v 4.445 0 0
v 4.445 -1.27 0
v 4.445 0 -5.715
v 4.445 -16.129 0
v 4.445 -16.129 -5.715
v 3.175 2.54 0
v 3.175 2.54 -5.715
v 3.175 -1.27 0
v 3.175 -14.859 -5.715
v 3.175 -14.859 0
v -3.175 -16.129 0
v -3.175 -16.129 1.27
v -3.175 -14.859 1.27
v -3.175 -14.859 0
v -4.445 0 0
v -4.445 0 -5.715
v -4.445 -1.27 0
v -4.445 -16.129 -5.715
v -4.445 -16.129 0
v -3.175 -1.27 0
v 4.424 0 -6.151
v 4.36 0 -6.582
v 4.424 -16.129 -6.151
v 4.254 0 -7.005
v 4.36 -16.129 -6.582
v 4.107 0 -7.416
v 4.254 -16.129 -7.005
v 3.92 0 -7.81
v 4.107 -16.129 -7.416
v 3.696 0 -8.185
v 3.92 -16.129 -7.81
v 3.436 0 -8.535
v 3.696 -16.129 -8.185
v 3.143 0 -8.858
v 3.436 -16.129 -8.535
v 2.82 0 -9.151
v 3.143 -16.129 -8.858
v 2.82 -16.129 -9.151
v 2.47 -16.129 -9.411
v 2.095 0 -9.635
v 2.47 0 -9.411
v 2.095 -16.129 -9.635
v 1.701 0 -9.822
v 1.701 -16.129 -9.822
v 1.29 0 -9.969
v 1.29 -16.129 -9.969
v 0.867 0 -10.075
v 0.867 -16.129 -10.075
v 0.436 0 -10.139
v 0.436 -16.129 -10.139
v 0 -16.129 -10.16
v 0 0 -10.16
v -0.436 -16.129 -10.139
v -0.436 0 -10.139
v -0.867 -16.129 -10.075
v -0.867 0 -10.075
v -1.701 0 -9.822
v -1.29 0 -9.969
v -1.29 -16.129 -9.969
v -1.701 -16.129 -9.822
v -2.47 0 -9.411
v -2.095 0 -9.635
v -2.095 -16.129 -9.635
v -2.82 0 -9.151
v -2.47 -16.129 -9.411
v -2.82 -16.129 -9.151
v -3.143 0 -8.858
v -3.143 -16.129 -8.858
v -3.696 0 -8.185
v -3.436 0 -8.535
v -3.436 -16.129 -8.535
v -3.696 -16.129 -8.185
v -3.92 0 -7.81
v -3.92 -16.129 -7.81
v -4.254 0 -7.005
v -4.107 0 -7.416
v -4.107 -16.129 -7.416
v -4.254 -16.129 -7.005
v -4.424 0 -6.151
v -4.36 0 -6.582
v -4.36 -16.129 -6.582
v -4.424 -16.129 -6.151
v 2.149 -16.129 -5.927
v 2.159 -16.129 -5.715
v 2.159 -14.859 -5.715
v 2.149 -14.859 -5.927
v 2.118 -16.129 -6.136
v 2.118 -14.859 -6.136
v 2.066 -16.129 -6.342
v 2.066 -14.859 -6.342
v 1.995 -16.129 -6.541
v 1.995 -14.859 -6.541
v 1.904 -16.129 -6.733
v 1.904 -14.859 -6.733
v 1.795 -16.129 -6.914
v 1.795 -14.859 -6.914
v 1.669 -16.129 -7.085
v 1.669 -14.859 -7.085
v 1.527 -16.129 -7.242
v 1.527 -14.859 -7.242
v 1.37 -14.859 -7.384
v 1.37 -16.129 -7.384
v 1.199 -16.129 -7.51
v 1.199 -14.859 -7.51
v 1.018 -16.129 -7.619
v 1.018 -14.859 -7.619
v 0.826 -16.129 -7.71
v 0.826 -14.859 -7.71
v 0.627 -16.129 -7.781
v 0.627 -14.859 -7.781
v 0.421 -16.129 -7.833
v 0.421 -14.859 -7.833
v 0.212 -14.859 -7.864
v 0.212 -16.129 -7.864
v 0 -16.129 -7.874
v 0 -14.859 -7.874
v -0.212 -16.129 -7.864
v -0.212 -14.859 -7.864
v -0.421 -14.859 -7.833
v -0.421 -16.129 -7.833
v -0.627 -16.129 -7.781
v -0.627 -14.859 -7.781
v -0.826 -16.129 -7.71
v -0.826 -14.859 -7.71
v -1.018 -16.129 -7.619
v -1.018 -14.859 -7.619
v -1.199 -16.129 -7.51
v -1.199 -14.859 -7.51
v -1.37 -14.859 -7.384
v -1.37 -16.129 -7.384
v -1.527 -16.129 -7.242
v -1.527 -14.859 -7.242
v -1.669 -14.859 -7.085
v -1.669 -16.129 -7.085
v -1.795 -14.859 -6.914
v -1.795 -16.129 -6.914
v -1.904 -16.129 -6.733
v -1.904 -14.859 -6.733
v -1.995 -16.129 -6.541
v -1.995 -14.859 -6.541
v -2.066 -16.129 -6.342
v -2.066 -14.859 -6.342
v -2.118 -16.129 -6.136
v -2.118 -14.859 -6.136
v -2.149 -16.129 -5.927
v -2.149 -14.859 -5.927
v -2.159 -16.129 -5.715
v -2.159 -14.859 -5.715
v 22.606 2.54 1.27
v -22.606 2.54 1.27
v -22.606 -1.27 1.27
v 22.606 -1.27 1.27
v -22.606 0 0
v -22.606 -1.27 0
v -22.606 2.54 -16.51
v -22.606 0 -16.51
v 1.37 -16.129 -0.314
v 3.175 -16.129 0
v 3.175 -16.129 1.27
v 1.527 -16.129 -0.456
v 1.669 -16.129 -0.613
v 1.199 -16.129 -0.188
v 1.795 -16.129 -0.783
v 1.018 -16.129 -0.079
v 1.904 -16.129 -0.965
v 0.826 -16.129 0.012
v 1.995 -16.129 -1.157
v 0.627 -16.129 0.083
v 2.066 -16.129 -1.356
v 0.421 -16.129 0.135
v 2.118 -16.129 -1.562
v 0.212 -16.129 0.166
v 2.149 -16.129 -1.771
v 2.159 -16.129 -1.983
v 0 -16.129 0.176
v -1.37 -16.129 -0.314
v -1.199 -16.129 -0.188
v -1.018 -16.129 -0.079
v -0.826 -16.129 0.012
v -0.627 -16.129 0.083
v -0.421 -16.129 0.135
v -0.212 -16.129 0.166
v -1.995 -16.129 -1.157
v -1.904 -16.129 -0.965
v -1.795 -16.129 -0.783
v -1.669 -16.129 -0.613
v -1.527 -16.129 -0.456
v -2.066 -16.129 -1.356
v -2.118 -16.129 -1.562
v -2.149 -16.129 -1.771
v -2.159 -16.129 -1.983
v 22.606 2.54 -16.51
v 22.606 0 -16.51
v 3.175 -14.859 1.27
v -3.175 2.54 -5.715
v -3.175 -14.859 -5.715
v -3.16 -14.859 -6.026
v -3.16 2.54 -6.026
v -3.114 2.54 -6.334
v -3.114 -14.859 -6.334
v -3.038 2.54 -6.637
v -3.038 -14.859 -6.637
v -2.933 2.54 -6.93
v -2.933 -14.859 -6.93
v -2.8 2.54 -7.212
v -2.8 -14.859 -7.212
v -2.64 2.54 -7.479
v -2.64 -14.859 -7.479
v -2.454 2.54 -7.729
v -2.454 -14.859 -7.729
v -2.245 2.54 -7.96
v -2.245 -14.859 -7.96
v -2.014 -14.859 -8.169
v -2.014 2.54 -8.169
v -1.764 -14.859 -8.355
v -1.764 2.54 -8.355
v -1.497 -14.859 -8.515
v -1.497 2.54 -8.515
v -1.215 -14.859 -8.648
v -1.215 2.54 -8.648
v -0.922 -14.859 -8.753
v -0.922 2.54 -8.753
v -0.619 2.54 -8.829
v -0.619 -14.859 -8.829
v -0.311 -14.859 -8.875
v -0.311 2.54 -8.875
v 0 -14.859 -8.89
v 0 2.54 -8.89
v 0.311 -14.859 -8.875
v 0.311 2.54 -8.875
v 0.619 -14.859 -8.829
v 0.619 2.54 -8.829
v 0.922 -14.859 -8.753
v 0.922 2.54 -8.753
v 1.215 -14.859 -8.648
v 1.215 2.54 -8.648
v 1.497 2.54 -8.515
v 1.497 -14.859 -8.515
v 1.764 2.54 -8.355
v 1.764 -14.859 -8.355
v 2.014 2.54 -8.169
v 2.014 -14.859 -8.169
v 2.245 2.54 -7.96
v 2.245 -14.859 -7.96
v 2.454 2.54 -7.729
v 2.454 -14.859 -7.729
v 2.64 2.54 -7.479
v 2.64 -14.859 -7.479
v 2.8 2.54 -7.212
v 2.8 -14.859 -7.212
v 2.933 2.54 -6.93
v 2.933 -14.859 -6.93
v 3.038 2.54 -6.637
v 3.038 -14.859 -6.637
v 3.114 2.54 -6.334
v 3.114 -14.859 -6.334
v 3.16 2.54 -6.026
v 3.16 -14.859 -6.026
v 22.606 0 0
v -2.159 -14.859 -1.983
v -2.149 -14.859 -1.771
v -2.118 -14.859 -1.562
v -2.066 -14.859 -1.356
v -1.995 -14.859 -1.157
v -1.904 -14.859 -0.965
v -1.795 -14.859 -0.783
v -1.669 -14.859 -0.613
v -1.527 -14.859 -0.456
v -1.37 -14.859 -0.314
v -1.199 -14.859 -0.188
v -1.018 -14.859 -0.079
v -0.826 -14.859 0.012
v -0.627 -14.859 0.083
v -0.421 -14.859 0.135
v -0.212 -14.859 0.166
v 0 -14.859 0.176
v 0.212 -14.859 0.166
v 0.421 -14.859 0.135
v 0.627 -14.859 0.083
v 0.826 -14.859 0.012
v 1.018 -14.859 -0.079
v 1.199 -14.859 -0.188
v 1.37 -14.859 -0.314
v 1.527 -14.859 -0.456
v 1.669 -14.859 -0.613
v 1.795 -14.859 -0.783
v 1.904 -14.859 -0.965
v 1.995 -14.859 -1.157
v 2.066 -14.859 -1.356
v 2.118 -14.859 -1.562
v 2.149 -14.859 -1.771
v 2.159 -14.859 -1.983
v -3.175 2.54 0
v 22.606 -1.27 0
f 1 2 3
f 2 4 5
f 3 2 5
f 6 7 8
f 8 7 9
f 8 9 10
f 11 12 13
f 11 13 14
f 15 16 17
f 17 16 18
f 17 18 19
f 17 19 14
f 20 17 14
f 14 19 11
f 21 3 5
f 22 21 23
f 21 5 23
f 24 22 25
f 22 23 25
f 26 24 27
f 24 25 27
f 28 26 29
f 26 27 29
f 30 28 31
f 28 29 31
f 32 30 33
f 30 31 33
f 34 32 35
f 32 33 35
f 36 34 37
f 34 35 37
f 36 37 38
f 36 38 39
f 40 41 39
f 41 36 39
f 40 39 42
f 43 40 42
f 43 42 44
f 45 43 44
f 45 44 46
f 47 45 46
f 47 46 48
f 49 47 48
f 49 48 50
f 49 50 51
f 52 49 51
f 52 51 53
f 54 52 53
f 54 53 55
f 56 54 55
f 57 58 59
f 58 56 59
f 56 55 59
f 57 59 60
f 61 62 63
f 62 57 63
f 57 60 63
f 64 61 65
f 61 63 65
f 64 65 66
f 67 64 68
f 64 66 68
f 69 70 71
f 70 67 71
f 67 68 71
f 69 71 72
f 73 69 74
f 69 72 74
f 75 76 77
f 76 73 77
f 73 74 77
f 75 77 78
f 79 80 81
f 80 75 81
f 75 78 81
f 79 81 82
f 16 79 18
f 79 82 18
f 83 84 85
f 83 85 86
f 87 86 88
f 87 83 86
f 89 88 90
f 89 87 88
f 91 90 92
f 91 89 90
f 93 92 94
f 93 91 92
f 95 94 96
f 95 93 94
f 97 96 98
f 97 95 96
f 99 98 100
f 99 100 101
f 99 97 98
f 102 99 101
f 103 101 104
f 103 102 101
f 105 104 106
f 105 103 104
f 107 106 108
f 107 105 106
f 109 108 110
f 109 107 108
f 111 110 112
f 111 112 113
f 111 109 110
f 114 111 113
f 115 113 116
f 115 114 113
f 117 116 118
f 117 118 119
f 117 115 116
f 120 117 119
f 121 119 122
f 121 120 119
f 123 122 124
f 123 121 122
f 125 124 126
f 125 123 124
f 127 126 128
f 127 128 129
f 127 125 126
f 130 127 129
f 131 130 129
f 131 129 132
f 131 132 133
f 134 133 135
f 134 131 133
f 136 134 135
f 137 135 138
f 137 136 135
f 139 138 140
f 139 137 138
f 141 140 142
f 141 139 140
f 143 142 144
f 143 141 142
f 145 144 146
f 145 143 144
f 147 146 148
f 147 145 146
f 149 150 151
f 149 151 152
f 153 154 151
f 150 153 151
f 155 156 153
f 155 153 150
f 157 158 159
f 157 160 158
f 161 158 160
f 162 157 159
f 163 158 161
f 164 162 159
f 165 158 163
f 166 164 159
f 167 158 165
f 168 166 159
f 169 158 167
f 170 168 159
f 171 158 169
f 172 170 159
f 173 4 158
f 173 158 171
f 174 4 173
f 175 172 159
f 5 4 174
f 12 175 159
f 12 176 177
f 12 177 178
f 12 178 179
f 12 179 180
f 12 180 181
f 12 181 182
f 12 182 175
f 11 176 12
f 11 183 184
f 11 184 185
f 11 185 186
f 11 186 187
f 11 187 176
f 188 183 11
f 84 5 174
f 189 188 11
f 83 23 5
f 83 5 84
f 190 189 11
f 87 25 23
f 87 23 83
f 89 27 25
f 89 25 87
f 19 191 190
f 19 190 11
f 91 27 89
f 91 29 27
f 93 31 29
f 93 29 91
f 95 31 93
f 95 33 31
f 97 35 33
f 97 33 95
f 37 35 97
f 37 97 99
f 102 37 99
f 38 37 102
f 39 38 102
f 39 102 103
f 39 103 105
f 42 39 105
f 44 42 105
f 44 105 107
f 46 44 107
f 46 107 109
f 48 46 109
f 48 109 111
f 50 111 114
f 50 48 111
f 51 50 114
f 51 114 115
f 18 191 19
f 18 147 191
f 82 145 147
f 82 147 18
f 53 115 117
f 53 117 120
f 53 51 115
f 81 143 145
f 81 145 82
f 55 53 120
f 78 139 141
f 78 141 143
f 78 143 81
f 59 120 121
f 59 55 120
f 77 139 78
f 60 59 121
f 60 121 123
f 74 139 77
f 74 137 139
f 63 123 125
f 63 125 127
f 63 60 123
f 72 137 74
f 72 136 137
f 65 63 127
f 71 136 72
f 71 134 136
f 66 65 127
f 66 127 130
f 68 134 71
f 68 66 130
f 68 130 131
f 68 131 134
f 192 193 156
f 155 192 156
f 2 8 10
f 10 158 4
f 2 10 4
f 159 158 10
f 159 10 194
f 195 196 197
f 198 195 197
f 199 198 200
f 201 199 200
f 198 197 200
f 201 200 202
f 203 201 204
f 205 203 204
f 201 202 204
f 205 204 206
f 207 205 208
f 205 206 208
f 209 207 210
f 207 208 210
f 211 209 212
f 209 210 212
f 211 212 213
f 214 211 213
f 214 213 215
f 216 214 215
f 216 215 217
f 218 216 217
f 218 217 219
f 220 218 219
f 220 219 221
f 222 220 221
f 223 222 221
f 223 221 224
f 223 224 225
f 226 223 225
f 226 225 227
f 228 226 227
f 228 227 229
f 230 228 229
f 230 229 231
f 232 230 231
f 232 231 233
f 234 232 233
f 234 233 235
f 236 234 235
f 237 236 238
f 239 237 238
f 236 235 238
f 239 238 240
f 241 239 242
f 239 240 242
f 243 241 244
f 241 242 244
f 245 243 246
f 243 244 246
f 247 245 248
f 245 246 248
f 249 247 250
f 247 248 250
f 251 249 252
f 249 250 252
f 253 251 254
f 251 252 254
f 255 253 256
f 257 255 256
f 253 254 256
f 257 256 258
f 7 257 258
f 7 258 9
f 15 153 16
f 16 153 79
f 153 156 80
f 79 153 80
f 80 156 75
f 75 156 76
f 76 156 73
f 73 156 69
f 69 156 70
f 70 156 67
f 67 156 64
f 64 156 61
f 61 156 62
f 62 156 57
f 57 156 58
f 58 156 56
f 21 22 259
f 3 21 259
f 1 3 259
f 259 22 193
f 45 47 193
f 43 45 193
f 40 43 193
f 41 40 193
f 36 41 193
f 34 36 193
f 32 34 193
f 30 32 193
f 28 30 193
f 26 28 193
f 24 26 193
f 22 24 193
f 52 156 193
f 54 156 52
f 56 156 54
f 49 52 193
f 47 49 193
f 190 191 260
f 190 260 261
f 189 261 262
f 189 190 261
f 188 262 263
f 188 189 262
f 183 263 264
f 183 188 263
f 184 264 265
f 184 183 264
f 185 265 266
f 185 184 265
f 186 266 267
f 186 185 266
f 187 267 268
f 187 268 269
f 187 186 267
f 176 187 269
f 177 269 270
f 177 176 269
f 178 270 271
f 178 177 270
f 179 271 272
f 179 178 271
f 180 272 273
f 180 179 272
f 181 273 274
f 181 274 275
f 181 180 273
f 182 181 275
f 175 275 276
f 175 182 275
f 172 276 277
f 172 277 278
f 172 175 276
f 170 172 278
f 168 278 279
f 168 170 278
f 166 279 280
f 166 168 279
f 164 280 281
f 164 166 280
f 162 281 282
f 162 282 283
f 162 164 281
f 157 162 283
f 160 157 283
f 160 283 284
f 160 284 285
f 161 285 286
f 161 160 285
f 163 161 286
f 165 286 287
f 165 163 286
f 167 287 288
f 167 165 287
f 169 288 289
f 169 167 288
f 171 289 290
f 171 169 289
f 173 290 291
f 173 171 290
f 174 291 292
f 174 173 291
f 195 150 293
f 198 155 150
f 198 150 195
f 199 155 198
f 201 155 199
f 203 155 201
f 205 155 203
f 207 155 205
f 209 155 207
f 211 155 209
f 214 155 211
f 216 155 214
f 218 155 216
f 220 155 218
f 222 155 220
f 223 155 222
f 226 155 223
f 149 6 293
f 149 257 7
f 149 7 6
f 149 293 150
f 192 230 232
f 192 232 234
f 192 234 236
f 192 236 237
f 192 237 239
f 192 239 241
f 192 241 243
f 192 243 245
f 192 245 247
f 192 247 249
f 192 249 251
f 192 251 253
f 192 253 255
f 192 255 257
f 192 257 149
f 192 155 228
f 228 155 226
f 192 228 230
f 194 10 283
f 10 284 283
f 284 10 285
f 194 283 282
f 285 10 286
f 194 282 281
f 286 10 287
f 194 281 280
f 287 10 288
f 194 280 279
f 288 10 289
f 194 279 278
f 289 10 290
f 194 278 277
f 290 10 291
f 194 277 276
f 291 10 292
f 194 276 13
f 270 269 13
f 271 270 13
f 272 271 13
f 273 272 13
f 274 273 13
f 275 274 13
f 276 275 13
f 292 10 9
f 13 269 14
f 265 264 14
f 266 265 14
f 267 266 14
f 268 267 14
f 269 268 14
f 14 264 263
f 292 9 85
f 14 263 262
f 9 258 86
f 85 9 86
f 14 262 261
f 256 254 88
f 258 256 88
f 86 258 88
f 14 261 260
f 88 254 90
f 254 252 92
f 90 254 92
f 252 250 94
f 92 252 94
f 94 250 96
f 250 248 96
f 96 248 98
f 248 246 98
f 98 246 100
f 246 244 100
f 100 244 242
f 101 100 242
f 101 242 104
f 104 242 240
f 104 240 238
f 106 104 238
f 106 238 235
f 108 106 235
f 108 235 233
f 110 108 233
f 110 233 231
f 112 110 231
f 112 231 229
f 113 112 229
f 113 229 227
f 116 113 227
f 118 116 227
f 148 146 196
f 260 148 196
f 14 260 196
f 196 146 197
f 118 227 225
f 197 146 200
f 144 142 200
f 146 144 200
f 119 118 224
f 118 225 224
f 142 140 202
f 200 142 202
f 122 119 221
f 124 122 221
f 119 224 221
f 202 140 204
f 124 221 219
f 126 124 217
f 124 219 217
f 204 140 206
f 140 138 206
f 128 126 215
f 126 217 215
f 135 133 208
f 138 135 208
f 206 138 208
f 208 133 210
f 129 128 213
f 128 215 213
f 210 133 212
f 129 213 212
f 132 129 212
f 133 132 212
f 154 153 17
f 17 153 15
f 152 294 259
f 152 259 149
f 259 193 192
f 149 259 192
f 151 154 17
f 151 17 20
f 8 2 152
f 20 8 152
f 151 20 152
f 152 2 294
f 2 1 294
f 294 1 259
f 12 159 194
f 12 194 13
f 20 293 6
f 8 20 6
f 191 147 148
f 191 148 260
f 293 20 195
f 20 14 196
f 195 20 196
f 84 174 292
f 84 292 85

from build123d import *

# Parameters (mm, degrees)
BOSS_EXTRUDE1_DEPTH = 2.54
BOSS_EXTRUDE2_START = -16.129
BOSS_EXTRUDE2_DEPTH = 18.669
SKETCH3_W           = 45.212
SKETCH3_H           = 3.81
BOSS_EXTRUDE3_DEPTH = 1.27
BOSS_EXTRUDE4_START = -16.129
BOSS_EXTRUDE4_DEPTH = 1.27


with BuildPart() as part:
    # Sketch1 → Boss-Extrude1 (new body)
    with BuildSketch(Plane(origin=(0, 0, 0), x_dir=(1, 0, 0), z_dir=(0, 1, 0))):
        with BuildLine():
            Line((22.606, 0), (22.606, 16.51))
            Line((22.606, 16.51), (-22.606, 16.51))
            Line((-22.606, 16.51), (-22.606, 0))
            Line((-22.606, 0), (-4.445, 0))
            Line((-4.445, 0), (-4.445, 5.715))
            ThreePointArc((-4.445, 5.715), (0, 10.16), (4.445, 5.715))
            Line((4.445, 5.715), (4.445, 0))
            Line((4.445, 0), (22.606, 0))
        make_face()
    extrude(amount=BOSS_EXTRUDE1_DEPTH)

    # Sketch2 → Boss-Extrude2 (add)
    with BuildSketch(Plane(origin=(0, 0, 0), x_dir=(1, 0, 0), z_dir=(0, 1, 0)).offset(BOSS_EXTRUDE2_START)):
        with BuildLine():
            Line((-4.445, 0), (-3.175, 0))
            Line((-3.175, 0), (-3.175, 5.715))
            ThreePointArc((-3.175, 5.715), (0, 8.89), (3.175, 5.715))
            Line((3.175, 5.715), (3.175, 0))
            Line((3.175, 0), (4.445, 0))
            Line((4.445, 0), (4.445, 5.715))
            ThreePointArc((4.445, 5.715), (0, 10.16), (-4.445, 5.715))
            Line((-4.445, 5.715), (-4.445, 0))
        make_face()
    extrude(amount=BOSS_EXTRUDE2_DEPTH)

    # Sketch3 → Boss-Extrude3 (add)
    with BuildSketch(Plane.XY):
        with Locations((0, 0.635)):
            Rectangle(SKETCH3_W, SKETCH3_H)
    extrude(amount=BOSS_EXTRUDE3_DEPTH)

    # Sketch4 → Boss-Extrude4 (add)
    with BuildSketch(Plane(origin=(0, 0, 0), x_dir=(1, 0, 0), z_dir=(0, 1, 0)).offset(BOSS_EXTRUDE4_START)):
        with BuildLine():
            Line((3.175, 5.715), (3.175, -1.27))
            Line((3.175, -1.27), (-3.175, -1.27))
            Line((-3.175, -1.27), (-3.175, 5.715))
            ThreePointArc((-3.175, 5.715), (0, 8.89), (3.175, 5.715))
        make_face()
        with BuildLine():
            Line((-2.159, 5.715), (-2.159, 1.982909029))
            ThreePointArc((-2.159, 1.982909029), (0, -0.176090971), (2.159, 1.982909029))
            Line((2.159, 1.982909029), (2.159, 5.715))
            ThreePointArc((2.159, 5.715), (0, 7.874), (-2.159, 5.715))
        make_face(mode=Mode.SUBTRACT)
    extrude(amount=BOSS_EXTRUDE4_DEPTH)


solid = part.part
